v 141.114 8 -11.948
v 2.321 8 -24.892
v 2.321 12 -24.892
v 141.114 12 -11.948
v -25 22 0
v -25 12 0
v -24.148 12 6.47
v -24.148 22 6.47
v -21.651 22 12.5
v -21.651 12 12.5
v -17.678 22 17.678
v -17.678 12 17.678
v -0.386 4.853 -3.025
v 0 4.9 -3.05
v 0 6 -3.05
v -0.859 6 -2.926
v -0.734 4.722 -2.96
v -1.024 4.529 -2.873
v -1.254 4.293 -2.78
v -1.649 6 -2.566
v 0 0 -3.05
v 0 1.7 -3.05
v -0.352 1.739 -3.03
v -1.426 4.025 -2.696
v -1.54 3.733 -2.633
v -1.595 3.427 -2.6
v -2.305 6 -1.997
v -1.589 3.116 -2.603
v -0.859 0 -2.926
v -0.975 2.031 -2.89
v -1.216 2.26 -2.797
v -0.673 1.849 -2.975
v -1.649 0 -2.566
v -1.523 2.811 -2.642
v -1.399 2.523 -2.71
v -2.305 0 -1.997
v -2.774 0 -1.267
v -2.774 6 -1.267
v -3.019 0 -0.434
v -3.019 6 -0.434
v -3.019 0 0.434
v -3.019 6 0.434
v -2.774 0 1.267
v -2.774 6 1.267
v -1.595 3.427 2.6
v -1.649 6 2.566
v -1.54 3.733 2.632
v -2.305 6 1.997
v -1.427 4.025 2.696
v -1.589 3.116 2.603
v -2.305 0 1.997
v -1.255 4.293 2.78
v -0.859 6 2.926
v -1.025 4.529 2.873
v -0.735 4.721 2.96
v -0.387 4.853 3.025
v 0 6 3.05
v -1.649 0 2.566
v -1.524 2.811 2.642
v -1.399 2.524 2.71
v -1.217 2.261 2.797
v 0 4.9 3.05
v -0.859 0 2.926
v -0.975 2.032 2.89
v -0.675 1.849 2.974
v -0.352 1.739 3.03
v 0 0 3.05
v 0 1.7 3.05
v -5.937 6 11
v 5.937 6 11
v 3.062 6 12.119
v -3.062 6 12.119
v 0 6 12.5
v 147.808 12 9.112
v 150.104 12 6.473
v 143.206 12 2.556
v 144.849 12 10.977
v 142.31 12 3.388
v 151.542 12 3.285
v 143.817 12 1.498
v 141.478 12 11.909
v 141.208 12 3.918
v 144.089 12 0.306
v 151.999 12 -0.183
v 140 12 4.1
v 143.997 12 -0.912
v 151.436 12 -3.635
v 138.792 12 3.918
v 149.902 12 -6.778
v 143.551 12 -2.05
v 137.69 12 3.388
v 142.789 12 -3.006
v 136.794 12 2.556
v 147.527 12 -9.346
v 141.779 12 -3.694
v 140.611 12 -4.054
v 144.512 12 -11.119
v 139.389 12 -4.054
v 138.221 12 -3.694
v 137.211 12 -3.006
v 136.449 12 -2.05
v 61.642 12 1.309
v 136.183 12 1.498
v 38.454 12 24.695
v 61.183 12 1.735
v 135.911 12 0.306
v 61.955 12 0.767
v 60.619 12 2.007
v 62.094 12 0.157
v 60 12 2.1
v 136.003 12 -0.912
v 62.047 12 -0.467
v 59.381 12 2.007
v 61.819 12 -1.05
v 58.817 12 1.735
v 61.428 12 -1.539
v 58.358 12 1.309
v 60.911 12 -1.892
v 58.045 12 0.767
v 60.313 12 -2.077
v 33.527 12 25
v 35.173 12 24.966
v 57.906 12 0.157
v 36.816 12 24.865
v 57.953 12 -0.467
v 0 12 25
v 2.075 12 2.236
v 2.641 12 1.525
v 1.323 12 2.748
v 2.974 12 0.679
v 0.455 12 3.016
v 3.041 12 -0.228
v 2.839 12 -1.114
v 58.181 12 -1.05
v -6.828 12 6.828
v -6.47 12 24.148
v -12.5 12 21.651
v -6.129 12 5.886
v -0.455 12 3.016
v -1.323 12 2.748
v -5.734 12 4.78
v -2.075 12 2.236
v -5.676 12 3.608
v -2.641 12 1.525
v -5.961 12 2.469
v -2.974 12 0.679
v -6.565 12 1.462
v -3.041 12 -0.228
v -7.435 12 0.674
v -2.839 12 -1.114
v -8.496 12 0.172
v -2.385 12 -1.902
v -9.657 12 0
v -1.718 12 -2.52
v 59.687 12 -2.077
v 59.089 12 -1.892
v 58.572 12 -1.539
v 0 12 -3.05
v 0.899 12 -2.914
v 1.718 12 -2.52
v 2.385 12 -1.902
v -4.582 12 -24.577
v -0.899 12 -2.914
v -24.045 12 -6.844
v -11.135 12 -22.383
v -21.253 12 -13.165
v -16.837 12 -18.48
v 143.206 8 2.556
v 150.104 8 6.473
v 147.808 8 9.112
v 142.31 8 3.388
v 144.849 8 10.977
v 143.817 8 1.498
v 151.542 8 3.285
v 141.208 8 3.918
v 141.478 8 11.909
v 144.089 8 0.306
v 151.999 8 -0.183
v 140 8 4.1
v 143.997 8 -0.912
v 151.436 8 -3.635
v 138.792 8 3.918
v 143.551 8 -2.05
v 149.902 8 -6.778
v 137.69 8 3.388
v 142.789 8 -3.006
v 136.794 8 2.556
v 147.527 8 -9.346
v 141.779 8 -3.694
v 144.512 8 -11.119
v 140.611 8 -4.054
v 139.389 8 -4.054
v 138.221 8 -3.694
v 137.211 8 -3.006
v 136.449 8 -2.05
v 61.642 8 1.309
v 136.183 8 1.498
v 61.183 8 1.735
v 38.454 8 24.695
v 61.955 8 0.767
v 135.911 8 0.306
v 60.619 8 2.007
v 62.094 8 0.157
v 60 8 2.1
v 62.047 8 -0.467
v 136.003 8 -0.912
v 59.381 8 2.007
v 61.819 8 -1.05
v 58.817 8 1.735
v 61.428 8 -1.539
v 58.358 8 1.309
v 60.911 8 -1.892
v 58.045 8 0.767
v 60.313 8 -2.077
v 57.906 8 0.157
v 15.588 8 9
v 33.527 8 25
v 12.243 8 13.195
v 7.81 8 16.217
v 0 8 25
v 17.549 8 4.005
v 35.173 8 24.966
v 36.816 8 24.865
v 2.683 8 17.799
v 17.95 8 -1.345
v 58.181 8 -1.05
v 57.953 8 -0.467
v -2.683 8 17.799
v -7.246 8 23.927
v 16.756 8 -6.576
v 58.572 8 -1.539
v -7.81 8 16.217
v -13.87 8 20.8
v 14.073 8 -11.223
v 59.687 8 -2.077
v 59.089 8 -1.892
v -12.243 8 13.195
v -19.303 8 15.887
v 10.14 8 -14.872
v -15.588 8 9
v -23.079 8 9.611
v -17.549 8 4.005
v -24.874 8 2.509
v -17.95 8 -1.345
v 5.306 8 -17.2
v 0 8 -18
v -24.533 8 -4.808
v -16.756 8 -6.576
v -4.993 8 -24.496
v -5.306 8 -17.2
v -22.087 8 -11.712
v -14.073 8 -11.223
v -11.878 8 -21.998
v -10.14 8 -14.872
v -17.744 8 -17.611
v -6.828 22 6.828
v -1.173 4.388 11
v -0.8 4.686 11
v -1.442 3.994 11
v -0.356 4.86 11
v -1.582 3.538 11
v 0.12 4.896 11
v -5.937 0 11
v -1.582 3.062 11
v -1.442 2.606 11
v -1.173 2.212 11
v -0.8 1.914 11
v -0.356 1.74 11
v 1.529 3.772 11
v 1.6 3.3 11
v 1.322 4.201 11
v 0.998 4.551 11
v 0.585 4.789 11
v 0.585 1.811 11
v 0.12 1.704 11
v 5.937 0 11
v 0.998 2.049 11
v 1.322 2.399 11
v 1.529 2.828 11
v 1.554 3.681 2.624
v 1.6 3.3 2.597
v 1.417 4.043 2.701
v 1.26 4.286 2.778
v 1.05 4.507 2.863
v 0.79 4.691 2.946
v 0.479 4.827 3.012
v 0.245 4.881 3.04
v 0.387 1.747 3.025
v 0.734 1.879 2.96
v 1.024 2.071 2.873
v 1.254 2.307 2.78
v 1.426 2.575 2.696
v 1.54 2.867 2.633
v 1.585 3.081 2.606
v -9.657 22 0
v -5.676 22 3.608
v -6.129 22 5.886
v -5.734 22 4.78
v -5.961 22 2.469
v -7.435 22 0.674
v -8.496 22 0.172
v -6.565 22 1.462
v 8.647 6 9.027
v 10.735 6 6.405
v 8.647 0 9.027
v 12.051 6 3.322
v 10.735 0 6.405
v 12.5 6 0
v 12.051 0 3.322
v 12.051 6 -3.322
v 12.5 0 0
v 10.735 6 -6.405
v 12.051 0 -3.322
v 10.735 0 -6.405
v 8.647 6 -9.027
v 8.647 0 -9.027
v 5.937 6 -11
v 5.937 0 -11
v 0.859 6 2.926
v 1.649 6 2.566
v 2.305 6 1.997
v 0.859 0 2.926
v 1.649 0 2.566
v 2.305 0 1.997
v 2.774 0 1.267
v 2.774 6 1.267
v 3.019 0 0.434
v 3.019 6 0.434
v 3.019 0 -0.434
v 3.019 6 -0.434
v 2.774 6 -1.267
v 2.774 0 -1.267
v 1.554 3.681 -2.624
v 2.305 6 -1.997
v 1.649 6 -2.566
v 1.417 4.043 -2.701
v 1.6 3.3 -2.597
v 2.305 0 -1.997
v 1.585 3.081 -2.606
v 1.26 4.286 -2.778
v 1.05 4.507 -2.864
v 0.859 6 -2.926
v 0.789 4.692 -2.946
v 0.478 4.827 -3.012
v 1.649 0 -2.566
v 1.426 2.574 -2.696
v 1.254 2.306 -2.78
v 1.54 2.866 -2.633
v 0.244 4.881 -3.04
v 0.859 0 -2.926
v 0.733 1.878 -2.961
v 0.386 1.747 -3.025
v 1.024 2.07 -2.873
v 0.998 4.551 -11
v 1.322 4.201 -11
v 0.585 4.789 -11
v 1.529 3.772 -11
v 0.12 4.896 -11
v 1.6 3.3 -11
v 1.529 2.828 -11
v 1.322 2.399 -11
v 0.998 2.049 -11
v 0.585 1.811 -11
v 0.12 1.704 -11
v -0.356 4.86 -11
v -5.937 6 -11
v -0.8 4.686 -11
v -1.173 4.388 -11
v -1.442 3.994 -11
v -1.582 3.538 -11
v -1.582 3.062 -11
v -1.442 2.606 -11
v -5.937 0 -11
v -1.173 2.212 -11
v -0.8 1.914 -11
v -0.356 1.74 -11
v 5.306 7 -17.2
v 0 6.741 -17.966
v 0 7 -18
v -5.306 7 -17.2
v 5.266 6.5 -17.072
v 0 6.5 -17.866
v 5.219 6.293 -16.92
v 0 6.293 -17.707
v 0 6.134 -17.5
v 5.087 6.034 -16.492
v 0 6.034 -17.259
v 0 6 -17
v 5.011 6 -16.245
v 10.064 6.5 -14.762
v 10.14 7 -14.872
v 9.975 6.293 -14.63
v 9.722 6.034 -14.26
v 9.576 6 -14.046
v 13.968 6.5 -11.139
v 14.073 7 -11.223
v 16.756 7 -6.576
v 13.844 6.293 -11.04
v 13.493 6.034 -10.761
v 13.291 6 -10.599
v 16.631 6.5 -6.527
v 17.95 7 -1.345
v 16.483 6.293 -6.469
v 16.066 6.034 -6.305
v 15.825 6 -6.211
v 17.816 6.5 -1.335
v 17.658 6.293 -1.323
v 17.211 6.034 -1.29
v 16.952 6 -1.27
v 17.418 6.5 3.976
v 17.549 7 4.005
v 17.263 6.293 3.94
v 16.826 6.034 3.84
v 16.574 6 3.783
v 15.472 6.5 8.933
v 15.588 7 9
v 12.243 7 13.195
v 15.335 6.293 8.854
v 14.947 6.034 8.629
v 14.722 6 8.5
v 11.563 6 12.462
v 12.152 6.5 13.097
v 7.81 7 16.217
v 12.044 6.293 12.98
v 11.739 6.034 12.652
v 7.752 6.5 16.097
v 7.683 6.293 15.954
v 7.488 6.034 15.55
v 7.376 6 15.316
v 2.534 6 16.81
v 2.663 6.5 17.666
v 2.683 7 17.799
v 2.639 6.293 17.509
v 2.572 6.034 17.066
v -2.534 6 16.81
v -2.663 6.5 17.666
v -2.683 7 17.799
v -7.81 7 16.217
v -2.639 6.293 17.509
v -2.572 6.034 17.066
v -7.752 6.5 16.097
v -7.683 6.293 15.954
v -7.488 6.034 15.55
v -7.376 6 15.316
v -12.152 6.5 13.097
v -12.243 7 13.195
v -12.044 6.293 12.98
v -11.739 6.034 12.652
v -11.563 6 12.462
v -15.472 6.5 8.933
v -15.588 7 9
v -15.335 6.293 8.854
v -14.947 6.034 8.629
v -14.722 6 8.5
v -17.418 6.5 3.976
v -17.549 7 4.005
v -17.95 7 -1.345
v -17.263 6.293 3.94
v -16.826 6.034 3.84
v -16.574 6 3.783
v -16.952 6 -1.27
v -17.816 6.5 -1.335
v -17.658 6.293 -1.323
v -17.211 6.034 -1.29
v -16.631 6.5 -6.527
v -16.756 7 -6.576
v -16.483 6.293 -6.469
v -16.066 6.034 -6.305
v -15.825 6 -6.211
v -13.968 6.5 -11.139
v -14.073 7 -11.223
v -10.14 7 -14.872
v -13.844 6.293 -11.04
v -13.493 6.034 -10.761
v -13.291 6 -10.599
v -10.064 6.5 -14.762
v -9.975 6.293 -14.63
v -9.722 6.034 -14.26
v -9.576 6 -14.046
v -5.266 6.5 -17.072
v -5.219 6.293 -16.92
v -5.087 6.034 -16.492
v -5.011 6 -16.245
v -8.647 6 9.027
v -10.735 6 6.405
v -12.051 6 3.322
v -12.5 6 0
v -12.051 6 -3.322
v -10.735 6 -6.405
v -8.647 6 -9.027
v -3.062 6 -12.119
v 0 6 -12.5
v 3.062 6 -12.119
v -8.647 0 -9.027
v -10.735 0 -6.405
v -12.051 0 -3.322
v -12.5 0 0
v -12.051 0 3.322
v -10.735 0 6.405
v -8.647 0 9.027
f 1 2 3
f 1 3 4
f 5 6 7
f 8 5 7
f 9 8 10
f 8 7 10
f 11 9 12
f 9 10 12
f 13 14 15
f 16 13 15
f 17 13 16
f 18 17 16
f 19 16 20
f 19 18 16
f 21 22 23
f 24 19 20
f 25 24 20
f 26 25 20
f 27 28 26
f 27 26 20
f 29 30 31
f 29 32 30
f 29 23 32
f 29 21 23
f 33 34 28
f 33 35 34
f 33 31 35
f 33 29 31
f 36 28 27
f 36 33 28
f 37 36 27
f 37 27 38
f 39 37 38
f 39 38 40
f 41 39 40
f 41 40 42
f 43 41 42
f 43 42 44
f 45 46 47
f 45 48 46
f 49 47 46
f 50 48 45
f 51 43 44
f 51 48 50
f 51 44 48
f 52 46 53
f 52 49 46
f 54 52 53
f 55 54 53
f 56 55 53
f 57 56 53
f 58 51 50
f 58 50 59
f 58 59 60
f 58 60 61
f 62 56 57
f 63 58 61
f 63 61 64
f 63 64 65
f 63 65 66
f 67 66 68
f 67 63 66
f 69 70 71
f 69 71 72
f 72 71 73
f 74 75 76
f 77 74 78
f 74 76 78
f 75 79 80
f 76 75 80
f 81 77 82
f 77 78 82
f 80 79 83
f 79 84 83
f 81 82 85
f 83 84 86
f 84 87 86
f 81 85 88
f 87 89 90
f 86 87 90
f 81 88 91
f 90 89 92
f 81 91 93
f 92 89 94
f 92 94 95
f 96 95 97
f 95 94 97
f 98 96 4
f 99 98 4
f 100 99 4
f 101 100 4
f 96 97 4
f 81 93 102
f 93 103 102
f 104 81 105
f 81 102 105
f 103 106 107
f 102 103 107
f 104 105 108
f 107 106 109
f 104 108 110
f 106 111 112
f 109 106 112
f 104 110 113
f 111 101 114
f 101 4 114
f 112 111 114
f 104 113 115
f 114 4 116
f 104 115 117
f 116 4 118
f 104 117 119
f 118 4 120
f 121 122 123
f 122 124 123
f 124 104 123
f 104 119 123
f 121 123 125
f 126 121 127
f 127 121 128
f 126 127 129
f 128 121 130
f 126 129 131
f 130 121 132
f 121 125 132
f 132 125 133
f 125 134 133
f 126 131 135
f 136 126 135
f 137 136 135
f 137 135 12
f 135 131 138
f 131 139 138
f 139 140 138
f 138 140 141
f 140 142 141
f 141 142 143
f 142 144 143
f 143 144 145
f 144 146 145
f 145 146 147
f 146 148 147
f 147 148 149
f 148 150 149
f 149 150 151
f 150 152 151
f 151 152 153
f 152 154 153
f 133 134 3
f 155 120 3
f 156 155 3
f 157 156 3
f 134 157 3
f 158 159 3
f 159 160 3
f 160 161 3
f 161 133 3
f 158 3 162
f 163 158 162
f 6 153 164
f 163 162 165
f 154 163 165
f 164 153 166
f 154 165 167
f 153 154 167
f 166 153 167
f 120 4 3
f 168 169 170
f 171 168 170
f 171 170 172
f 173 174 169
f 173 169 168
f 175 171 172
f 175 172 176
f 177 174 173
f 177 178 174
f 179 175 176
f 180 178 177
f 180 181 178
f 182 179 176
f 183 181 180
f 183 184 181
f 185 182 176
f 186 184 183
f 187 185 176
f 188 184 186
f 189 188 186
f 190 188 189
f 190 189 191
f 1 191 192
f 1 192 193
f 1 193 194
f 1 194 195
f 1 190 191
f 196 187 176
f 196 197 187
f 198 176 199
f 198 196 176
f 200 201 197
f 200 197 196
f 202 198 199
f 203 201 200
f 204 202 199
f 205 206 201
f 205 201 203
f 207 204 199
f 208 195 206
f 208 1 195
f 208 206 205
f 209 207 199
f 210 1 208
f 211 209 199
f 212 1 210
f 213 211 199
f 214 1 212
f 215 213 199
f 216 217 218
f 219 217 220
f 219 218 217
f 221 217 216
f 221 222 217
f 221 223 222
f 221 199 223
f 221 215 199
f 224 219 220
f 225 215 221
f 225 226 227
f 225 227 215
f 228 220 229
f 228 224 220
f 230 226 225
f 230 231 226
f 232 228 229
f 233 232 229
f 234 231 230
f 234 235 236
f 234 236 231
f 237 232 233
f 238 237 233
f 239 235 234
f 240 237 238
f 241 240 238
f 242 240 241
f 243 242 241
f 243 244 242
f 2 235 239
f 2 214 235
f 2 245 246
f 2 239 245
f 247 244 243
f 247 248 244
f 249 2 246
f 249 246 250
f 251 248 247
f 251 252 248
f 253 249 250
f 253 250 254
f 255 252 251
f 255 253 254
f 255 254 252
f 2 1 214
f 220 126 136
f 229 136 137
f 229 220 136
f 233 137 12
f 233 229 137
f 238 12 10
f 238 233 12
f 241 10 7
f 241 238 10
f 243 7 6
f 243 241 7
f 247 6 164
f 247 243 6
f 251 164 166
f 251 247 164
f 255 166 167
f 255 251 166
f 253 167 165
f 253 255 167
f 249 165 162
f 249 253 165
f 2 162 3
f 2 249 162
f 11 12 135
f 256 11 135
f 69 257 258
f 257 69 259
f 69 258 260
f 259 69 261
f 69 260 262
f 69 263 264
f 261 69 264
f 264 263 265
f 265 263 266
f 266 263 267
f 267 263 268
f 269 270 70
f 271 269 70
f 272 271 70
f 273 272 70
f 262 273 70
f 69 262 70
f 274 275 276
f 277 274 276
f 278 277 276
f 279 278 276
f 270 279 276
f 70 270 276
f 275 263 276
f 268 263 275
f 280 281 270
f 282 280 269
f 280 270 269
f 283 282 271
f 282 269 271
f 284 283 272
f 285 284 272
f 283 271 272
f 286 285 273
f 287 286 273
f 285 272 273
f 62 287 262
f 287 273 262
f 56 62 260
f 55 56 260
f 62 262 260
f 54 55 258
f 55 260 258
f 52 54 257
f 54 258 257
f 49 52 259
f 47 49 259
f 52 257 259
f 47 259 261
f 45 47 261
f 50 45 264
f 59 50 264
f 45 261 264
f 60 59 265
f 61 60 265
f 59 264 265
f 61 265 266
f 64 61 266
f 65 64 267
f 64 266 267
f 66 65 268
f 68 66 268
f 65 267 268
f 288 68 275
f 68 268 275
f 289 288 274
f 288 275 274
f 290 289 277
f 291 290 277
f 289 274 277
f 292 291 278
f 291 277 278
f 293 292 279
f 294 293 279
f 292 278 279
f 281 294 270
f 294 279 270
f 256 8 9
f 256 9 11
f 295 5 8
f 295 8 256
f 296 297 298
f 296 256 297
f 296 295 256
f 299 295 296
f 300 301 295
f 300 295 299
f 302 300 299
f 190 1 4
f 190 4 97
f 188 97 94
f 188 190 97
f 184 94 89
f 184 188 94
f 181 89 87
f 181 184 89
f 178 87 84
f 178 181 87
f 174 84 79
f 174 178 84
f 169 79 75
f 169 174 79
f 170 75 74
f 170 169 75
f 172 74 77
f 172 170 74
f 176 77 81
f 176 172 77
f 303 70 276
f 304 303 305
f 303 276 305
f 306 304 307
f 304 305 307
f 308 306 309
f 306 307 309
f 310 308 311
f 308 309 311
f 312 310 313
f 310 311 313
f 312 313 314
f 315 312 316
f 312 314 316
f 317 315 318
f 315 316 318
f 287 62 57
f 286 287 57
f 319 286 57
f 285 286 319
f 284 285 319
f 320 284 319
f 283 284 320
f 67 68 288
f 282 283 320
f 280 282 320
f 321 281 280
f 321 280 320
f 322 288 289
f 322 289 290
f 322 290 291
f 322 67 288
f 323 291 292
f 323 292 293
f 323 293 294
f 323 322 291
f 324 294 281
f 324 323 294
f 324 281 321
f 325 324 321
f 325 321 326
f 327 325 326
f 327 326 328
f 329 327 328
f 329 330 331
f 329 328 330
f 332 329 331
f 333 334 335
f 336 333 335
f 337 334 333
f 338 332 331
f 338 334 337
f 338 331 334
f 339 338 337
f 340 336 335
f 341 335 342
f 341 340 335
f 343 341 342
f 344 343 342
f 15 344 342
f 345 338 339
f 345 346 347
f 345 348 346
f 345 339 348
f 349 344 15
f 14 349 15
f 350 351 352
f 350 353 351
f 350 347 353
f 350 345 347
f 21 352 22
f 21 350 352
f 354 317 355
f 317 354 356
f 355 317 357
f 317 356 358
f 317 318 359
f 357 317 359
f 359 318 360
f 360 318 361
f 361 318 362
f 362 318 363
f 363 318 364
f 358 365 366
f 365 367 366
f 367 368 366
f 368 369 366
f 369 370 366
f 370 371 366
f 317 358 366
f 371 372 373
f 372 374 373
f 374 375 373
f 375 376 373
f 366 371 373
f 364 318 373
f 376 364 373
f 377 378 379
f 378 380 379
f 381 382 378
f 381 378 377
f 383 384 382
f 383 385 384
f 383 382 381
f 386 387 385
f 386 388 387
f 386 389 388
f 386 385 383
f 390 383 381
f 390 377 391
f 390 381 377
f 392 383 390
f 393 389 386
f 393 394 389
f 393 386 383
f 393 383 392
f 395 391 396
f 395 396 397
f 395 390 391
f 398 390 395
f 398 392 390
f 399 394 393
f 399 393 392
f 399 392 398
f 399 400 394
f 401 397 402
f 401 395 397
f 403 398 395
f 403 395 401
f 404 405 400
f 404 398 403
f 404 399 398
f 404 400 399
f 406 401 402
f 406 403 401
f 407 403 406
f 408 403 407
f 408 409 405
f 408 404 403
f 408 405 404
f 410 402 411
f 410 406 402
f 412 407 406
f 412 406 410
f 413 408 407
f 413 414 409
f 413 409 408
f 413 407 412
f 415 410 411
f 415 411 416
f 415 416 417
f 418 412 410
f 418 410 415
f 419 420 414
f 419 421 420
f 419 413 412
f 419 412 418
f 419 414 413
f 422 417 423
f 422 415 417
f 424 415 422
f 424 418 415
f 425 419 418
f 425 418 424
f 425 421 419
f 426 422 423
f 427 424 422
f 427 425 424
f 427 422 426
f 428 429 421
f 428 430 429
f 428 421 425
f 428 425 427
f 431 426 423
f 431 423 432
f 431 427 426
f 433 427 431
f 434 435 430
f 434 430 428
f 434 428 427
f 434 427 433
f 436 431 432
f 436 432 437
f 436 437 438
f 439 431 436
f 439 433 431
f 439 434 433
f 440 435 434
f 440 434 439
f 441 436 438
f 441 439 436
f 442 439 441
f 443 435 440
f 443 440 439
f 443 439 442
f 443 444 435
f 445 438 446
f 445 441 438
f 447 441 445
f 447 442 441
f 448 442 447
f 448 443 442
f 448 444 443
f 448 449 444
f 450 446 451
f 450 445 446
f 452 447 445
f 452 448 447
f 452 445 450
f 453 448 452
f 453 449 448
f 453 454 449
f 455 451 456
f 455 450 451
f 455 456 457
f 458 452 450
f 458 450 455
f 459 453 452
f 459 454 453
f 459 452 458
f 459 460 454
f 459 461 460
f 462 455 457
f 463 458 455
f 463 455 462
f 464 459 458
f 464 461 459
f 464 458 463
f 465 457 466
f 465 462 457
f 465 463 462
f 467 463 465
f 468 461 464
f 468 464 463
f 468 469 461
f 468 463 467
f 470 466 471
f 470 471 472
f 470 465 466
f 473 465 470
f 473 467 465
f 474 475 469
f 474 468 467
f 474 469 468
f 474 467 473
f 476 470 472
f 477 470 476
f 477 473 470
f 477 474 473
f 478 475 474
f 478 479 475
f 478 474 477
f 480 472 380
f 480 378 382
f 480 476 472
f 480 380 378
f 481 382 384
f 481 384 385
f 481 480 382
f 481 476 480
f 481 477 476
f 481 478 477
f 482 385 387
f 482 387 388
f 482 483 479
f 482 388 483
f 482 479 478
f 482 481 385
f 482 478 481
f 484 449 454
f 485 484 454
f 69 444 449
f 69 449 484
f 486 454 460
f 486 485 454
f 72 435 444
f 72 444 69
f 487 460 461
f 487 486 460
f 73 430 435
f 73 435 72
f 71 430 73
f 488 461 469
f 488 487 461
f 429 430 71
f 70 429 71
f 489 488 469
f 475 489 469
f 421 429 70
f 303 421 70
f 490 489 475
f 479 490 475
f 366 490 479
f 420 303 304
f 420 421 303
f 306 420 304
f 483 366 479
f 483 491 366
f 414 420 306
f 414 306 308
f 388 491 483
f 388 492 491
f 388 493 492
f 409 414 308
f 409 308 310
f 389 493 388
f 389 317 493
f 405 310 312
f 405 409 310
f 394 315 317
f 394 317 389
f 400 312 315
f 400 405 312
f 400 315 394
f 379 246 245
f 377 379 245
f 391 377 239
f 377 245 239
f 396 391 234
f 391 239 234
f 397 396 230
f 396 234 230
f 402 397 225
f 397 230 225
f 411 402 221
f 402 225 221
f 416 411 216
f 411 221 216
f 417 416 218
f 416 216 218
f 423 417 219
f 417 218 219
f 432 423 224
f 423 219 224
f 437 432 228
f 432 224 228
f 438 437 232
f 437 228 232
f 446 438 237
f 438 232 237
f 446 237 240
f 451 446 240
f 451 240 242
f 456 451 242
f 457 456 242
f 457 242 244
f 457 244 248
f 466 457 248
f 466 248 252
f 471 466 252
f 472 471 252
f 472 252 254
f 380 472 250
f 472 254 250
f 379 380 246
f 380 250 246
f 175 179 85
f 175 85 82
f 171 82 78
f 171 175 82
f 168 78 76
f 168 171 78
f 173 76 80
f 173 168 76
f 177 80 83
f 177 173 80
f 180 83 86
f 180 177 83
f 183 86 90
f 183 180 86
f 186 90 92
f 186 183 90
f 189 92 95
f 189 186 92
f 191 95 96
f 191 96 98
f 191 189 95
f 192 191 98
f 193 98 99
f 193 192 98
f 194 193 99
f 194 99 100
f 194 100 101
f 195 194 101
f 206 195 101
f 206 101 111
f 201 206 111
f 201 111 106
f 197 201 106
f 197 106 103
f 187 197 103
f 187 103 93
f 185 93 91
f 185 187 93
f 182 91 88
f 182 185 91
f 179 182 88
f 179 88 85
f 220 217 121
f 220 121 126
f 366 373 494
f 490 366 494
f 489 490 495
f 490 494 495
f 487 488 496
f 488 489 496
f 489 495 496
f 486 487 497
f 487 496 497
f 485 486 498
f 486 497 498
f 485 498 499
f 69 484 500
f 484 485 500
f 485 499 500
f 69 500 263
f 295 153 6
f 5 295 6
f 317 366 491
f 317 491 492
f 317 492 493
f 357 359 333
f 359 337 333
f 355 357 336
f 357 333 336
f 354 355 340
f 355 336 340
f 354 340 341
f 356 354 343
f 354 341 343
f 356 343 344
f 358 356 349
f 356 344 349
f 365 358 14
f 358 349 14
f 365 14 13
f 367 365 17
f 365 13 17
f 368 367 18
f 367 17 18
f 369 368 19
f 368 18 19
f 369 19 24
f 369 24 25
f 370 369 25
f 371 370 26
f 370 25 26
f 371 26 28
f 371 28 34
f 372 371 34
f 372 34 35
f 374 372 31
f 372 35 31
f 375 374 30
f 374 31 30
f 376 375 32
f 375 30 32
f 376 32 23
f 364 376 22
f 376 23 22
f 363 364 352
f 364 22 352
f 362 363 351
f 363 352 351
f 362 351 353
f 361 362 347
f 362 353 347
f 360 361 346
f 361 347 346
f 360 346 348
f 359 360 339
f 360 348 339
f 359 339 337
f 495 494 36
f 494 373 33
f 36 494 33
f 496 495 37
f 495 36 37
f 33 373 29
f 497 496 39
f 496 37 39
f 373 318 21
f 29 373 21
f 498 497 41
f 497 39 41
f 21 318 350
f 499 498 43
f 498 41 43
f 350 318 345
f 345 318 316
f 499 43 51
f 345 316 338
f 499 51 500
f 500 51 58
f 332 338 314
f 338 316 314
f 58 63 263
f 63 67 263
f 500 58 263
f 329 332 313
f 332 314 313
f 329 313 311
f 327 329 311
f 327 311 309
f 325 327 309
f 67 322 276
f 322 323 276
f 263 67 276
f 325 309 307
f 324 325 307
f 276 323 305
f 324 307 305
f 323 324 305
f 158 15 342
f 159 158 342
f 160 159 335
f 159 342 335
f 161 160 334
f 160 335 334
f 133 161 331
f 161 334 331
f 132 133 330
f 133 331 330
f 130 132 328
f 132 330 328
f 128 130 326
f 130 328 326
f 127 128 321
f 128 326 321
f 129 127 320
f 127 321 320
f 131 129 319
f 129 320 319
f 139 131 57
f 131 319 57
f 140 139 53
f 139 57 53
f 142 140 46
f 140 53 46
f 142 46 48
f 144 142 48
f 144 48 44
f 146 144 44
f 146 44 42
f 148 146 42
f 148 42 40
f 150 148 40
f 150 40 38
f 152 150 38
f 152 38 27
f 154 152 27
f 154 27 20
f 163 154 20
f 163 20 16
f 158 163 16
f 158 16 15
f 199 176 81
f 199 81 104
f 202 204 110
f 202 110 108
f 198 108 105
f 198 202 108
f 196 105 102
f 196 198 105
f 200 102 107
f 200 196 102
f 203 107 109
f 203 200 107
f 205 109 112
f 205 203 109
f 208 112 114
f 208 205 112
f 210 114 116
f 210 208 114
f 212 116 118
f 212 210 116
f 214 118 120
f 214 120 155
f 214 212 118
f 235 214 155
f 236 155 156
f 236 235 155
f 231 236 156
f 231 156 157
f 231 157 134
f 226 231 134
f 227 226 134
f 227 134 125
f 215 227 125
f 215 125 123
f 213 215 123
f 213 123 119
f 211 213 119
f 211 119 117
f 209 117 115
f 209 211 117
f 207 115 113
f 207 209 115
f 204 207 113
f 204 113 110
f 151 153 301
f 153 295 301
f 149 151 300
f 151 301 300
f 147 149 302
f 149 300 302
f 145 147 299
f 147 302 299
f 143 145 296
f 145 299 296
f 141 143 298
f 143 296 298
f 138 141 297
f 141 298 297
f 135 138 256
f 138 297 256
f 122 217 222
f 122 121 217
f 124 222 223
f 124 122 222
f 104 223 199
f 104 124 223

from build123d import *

# Parameters (mm, degrees)
SKETCH_1_R          = 12.5
SKETCH_1_R_2        = 3.05
EXTRUDE_1_DEPTH     = 8
SKETCH_2_R          = 1.6
CUT_EXTRUDE_4_DEPTH = 12.5
SKETCH_3_R          = 4.1
SKETCH_3_R_2        = 2.1
EXTRUDE_2_DEPTH     = 4
SKETCH_4_R          = 18
EXTRUDE_3_DEPTH     = 2
FILLET_2_R          = 40
FILLET_1_R          = 1
EXTRUDE_4_DEPTH     = 10
FILLET_3_R          = 4
SKETCH_6_R          = 3.05
CUT_EXTRUDE_5_DEPTH = 12
CUT_EXTRUDE_6_REACH = 157.605


with BuildPart() as part:
    # 草图1 → 凸台-拉伸1 (new body)
    with BuildSketch(Plane(origin=(0, 0, 0), x_dir=(1, 0, 0), z_dir=(0, 1, 0))):
        with Locations(Location((0, 0, 0), (0, 0, 270))):
            Circle(SKETCH_1_R)
        with Locations(Location((0, 0, 0), (0, 0, 270))):
            Circle(SKETCH_1_R_2, mode=Mode.SUBTRACT)
    extrude(amount=EXTRUDE_1_DEPTH)

    # 草图2 → 切除-拉伸4 (cut, symmetric)
    with BuildSketch(Plane.XY):
        with Locations((0, 3.3)):
            Circle(SKETCH_2_R)
    extrude(amount=CUT_EXTRUDE_4_DEPTH, both=True, mode=Mode.SUBTRACT)

    # 草图3 → 凸台-拉伸2 (add)
    with BuildSketch(Plane(origin=(0, 8, 0), x_dir=(1, 0, 0), z_dir=(0, 1, 0))):
        with BuildLine():
            Line((2.321428571, 24.891986047), (141.114285714, 11.948153303))
            ThreePointArc((141.114285714, 11.948153303), (151.998605375, 0.182945465), (141.478035479, -11.908627592))
            Line((141.478035479, -11.908627592), (36, -25))
            Line((36, -25), (0, -25))
            ThreePointArc((0, -25), (-24.972981912, 1.161970054), (2.321428571, 24.891986047))
        make_face()
        with Locations(Location((140, 0, 0), (0, 0, 270))):
            Circle(SKETCH_3_R, mode=Mode.SUBTRACT)
        with Locations(Location((60, 0, 0), (0, 0, 270))):
            Circle(SKETCH_3_R_2, mode=Mode.SUBTRACT)
    extrude(amount=EXTRUDE_2_DEPTH)

    # 草图4 → 凸台-拉伸3 (add)
    with BuildSketch(Plane.XZ.offset(-8)):
        with Locations(Location((0, 0, 0), (0, 0, 270))):
            Circle(SKETCH_4_R)
    extrude(amount=EXTRUDE_3_DEPTH)

    # 圆角2
    fillet_2_edges = [part.edges().sort_by_distance(p)[0] for p in [
        (36, 10, 25),
    ]]
    fillet(fillet_2_edges, radius=FILLET_2_R)

    # 圆角1
    fillet_1_edges = [part.edges().sort_by_distance(p)[0] for p in [
        (0, 6, 18),
    ]]
    fillet(fillet_1_edges, radius=FILLET_1_R)

    # 草图5 → 凸台-拉伸4 (add)
    with BuildSketch(Plane(origin=(0, 12, 0), x_dir=(1, 0, 0), z_dir=(0, 1, 0))):
        with BuildLine():
            Line((0, 0), (-25, 0))
            ThreePointArc((-25, 0), (-23.096988313, -9.567085809), (-17.67766953, -17.67766953))
            Line((-17.67766953, -17.67766953), (0, 0))
        make_face()
    extrude(amount=EXTRUDE_4_DEPTH)

    # 圆角3
    fillet_3_edges = [part.edges().sort_by_distance(p)[0] for p in [
        (0, 17, 0),
    ]]
    fillet(fillet_3_edges, radius=FILLET_3_R)

    # 草图6 → 切除-拉伸5 (cut)
    with BuildSketch(Plane.XZ):
        with Locations(Location((0, 0, 0), (0, 0, 270))):
            Circle(SKETCH_6_R)
    extrude(amount=-CUT_EXTRUDE_5_DEPTH, mode=Mode.SUBTRACT)

    # 切除-拉伸6: up to this face of the body (flat: up to its plane)
    cut_extrude_6_end = Plane(part.part.faces().sort_by_distance((0, 6, 16.519167389))[0])
    # 草图7 → 切除-拉伸6 (cut, up to the picked face)
    with BuildSketch(Plane.XZ, mode=Mode.PRIVATE) as cut_extrude_6_sk1:
        with BuildLine():
            ThreePointArc((5.937171044, 11), (0, 12.5), (-5.937171044, 11))
            Line((-5.937171044, 11), (5.937171044, 11))
        make_face()
    cut_extrude_6_tool1 = split(extrude(cut_extrude_6_sk1.sketch, amount=-CUT_EXTRUDE_6_REACH, mode=Mode.PRIVATE), bisect_by=cut_extrude_6_end, keep=Keep.BOTH, mode=Mode.PRIVATE)
    # 草图7 → 切除-拉伸6 (cut, up to the picked face)
    with BuildSketch(Plane.XZ, mode=Mode.PRIVATE) as cut_extrude_6_sk2:
        with BuildLine():
            Line((5.937171044, -11), (-5.937171044, -11))
            ThreePointArc((-5.937171044, -11), (0, -12.5), (5.937171044, -11))
        make_face()
    cut_extrude_6_tool2 = split(extrude(cut_extrude_6_sk2.sketch, amount=-CUT_EXTRUDE_6_REACH, mode=Mode.PRIVATE), bisect_by=cut_extrude_6_end, keep=Keep.BOTH, mode=Mode.PRIVATE)
    add(cut_extrude_6_tool1.solids().sort_by(Axis((0, 0, 11.603197), (0, 1, 0)))[0], mode=Mode.SUBTRACT)
    add(cut_extrude_6_tool2.solids().sort_by(Axis((0, 0, -11.603197), (0, 1, 0)))[0], mode=Mode.SUBTRACT)


solid = part.part
